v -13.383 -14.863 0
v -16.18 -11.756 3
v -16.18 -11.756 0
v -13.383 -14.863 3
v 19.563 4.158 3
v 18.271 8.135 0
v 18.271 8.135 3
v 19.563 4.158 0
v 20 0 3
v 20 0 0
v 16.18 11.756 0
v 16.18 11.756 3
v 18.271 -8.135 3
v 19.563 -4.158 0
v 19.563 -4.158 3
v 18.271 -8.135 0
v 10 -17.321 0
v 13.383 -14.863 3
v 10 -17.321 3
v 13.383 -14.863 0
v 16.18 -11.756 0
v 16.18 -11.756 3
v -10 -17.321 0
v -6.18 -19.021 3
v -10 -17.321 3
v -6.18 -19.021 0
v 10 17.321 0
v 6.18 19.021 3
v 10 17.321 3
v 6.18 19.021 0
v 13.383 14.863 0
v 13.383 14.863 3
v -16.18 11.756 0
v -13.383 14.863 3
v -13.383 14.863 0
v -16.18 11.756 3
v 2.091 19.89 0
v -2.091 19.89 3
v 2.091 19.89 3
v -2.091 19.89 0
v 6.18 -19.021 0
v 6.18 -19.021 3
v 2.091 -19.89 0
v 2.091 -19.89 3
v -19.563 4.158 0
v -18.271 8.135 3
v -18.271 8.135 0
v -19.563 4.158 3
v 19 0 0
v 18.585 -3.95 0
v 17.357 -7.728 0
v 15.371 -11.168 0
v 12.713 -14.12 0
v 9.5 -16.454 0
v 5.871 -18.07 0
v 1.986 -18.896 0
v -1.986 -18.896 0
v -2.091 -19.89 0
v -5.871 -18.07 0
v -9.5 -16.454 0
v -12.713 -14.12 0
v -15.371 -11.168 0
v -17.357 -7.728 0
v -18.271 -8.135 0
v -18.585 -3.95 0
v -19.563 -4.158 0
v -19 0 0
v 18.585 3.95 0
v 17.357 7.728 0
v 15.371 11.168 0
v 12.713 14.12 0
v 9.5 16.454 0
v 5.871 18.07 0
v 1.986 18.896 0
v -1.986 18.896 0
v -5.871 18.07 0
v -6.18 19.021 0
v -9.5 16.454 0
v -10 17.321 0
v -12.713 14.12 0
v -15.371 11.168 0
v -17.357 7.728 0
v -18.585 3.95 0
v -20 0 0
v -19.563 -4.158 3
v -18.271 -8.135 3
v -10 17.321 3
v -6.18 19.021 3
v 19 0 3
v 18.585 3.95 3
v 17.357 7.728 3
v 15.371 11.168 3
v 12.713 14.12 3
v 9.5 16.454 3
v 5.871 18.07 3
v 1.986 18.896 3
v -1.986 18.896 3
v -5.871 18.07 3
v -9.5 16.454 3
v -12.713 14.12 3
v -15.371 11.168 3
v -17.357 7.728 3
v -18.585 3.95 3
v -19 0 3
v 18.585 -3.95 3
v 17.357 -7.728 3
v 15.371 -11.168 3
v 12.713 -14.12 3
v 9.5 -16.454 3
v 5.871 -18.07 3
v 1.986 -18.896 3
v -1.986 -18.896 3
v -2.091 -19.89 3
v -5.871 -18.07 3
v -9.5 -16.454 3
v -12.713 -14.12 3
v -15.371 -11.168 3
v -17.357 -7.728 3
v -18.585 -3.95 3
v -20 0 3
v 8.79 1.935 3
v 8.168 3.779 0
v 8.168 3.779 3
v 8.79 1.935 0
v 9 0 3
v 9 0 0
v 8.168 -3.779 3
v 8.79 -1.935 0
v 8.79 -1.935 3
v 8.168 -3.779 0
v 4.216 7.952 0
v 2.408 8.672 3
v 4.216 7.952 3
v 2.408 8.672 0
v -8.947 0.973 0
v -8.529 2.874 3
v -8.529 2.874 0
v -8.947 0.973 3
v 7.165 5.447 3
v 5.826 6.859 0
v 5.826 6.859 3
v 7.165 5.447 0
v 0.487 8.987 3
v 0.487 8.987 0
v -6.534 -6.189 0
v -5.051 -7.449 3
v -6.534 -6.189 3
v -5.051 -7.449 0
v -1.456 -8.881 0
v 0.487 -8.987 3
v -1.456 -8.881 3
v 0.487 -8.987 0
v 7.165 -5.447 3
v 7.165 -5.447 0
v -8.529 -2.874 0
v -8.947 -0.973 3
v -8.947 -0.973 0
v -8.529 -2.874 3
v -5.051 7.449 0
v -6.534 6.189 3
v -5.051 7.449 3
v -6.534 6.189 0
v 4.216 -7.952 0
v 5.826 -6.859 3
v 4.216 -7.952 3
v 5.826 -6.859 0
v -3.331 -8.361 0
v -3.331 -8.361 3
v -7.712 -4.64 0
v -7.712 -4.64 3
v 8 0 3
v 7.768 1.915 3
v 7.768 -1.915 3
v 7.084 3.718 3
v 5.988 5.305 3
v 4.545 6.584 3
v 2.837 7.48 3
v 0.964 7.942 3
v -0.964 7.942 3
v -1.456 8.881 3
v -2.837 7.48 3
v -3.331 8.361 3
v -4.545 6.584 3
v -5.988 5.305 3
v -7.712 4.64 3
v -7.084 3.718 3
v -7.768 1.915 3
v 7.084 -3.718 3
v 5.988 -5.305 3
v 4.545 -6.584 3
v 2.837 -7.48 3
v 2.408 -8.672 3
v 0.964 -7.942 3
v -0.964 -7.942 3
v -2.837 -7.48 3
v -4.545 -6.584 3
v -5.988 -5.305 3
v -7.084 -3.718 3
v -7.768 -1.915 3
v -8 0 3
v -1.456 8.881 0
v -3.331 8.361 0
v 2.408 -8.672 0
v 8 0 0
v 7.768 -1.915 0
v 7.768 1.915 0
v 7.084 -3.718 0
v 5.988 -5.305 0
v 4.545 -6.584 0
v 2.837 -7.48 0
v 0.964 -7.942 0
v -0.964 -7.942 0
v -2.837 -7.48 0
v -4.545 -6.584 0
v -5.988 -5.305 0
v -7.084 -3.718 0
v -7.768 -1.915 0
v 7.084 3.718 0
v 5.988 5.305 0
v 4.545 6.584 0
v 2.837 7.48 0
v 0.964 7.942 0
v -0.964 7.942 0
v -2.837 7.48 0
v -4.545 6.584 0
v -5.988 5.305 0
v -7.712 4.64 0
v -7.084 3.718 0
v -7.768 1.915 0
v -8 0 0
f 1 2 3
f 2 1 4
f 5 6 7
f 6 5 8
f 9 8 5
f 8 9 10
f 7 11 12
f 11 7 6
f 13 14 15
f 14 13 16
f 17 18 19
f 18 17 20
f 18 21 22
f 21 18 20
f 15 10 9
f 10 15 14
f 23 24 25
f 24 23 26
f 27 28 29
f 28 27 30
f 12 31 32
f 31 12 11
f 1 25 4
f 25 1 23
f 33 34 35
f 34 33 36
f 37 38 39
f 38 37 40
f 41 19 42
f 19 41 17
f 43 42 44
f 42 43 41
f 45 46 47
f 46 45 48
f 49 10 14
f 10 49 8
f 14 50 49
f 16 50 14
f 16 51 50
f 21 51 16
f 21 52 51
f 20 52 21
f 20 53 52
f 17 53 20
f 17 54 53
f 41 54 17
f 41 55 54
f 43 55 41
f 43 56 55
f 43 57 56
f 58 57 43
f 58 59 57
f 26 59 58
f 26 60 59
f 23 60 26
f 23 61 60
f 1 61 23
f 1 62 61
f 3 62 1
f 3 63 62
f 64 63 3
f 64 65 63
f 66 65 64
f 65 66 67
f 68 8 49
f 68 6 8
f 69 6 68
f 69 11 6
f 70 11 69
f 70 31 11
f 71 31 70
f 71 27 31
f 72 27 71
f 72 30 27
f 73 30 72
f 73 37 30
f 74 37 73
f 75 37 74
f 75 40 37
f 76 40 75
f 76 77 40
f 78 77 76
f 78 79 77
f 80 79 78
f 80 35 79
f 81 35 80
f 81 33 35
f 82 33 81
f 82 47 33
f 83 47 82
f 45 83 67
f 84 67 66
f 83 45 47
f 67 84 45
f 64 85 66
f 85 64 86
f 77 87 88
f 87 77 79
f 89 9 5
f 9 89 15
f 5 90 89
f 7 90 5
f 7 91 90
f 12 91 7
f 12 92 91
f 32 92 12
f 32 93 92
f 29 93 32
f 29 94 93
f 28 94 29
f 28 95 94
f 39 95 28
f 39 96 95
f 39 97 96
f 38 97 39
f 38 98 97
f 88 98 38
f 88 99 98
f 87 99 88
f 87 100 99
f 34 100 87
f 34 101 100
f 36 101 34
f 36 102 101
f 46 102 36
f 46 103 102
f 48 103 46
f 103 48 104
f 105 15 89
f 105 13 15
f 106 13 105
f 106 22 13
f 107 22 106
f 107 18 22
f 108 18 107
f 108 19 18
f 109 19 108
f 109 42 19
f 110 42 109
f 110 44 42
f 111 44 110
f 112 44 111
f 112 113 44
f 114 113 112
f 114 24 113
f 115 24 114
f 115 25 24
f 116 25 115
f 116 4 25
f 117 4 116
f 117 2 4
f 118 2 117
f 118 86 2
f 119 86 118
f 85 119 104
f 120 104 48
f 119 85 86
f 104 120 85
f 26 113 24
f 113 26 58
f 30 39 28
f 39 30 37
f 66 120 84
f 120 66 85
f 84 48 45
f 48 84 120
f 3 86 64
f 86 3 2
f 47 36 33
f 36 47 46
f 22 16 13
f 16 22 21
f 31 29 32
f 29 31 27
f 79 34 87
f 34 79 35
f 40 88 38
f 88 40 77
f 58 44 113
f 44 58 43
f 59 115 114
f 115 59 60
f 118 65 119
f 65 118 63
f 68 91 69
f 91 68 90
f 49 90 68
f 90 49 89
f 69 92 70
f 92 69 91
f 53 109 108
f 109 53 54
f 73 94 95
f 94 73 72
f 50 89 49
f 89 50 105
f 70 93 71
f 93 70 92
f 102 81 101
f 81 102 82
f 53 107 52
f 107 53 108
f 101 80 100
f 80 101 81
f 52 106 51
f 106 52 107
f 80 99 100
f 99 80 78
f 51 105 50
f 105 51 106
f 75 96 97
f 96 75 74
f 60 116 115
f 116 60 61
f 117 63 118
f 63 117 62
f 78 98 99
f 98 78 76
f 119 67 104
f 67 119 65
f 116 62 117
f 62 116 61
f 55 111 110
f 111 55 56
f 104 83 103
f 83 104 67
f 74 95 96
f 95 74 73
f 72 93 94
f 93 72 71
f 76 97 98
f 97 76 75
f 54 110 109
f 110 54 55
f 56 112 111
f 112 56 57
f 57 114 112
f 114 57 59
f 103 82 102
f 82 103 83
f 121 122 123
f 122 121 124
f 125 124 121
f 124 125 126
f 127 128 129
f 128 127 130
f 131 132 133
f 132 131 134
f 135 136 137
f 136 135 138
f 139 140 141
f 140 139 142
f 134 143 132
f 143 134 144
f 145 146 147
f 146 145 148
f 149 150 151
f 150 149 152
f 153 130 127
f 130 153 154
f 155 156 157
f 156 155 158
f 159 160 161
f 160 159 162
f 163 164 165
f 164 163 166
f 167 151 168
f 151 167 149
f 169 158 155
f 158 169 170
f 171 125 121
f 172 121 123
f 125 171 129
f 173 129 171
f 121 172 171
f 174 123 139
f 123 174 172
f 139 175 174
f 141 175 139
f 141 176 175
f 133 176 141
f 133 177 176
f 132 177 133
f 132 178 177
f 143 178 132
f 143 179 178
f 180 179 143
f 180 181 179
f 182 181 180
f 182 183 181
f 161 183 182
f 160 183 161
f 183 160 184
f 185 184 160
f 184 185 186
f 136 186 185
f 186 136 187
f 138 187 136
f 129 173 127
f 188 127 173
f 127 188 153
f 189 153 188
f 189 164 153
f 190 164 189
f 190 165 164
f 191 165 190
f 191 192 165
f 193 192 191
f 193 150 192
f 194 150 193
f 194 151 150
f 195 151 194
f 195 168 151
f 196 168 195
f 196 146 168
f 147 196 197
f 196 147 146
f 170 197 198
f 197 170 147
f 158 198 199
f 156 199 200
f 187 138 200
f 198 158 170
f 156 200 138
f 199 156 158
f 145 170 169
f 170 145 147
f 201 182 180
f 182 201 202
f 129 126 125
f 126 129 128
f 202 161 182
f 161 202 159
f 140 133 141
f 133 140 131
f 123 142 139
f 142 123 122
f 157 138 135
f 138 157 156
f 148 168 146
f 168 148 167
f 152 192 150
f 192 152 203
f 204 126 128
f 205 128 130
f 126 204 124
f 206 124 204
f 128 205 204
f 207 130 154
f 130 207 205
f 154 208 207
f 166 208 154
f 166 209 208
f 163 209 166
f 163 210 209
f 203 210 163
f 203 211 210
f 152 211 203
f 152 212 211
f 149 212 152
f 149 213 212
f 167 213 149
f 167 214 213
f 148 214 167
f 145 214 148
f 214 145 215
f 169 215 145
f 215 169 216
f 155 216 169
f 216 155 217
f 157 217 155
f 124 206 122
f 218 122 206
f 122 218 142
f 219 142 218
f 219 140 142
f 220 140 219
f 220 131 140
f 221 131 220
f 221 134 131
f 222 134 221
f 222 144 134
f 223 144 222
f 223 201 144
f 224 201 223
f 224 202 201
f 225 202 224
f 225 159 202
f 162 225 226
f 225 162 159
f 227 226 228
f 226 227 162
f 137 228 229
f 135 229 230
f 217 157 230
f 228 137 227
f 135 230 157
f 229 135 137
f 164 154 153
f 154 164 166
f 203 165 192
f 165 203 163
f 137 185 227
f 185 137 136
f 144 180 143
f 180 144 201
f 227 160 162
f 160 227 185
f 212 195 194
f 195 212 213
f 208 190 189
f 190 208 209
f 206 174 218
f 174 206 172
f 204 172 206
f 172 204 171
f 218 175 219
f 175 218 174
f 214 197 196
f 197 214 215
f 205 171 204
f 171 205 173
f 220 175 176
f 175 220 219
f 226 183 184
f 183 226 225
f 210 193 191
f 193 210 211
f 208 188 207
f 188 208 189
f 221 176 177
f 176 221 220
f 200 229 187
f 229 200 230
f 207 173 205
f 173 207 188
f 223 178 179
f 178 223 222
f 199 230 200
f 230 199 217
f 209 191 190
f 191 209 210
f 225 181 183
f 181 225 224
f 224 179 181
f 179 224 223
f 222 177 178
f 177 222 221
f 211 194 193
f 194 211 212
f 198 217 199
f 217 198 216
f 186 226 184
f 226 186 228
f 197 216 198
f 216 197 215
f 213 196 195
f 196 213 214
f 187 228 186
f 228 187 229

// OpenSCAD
module circle_extrude(radius, height) {
    difference() {
        cylinder(h = height, r = radius);
        translate([0, 0, -1]) cylinder(h = height + 2, r = radius - 1);
    }
}

circle_extrude(20, 3);
circle_extrude(9, 3);
